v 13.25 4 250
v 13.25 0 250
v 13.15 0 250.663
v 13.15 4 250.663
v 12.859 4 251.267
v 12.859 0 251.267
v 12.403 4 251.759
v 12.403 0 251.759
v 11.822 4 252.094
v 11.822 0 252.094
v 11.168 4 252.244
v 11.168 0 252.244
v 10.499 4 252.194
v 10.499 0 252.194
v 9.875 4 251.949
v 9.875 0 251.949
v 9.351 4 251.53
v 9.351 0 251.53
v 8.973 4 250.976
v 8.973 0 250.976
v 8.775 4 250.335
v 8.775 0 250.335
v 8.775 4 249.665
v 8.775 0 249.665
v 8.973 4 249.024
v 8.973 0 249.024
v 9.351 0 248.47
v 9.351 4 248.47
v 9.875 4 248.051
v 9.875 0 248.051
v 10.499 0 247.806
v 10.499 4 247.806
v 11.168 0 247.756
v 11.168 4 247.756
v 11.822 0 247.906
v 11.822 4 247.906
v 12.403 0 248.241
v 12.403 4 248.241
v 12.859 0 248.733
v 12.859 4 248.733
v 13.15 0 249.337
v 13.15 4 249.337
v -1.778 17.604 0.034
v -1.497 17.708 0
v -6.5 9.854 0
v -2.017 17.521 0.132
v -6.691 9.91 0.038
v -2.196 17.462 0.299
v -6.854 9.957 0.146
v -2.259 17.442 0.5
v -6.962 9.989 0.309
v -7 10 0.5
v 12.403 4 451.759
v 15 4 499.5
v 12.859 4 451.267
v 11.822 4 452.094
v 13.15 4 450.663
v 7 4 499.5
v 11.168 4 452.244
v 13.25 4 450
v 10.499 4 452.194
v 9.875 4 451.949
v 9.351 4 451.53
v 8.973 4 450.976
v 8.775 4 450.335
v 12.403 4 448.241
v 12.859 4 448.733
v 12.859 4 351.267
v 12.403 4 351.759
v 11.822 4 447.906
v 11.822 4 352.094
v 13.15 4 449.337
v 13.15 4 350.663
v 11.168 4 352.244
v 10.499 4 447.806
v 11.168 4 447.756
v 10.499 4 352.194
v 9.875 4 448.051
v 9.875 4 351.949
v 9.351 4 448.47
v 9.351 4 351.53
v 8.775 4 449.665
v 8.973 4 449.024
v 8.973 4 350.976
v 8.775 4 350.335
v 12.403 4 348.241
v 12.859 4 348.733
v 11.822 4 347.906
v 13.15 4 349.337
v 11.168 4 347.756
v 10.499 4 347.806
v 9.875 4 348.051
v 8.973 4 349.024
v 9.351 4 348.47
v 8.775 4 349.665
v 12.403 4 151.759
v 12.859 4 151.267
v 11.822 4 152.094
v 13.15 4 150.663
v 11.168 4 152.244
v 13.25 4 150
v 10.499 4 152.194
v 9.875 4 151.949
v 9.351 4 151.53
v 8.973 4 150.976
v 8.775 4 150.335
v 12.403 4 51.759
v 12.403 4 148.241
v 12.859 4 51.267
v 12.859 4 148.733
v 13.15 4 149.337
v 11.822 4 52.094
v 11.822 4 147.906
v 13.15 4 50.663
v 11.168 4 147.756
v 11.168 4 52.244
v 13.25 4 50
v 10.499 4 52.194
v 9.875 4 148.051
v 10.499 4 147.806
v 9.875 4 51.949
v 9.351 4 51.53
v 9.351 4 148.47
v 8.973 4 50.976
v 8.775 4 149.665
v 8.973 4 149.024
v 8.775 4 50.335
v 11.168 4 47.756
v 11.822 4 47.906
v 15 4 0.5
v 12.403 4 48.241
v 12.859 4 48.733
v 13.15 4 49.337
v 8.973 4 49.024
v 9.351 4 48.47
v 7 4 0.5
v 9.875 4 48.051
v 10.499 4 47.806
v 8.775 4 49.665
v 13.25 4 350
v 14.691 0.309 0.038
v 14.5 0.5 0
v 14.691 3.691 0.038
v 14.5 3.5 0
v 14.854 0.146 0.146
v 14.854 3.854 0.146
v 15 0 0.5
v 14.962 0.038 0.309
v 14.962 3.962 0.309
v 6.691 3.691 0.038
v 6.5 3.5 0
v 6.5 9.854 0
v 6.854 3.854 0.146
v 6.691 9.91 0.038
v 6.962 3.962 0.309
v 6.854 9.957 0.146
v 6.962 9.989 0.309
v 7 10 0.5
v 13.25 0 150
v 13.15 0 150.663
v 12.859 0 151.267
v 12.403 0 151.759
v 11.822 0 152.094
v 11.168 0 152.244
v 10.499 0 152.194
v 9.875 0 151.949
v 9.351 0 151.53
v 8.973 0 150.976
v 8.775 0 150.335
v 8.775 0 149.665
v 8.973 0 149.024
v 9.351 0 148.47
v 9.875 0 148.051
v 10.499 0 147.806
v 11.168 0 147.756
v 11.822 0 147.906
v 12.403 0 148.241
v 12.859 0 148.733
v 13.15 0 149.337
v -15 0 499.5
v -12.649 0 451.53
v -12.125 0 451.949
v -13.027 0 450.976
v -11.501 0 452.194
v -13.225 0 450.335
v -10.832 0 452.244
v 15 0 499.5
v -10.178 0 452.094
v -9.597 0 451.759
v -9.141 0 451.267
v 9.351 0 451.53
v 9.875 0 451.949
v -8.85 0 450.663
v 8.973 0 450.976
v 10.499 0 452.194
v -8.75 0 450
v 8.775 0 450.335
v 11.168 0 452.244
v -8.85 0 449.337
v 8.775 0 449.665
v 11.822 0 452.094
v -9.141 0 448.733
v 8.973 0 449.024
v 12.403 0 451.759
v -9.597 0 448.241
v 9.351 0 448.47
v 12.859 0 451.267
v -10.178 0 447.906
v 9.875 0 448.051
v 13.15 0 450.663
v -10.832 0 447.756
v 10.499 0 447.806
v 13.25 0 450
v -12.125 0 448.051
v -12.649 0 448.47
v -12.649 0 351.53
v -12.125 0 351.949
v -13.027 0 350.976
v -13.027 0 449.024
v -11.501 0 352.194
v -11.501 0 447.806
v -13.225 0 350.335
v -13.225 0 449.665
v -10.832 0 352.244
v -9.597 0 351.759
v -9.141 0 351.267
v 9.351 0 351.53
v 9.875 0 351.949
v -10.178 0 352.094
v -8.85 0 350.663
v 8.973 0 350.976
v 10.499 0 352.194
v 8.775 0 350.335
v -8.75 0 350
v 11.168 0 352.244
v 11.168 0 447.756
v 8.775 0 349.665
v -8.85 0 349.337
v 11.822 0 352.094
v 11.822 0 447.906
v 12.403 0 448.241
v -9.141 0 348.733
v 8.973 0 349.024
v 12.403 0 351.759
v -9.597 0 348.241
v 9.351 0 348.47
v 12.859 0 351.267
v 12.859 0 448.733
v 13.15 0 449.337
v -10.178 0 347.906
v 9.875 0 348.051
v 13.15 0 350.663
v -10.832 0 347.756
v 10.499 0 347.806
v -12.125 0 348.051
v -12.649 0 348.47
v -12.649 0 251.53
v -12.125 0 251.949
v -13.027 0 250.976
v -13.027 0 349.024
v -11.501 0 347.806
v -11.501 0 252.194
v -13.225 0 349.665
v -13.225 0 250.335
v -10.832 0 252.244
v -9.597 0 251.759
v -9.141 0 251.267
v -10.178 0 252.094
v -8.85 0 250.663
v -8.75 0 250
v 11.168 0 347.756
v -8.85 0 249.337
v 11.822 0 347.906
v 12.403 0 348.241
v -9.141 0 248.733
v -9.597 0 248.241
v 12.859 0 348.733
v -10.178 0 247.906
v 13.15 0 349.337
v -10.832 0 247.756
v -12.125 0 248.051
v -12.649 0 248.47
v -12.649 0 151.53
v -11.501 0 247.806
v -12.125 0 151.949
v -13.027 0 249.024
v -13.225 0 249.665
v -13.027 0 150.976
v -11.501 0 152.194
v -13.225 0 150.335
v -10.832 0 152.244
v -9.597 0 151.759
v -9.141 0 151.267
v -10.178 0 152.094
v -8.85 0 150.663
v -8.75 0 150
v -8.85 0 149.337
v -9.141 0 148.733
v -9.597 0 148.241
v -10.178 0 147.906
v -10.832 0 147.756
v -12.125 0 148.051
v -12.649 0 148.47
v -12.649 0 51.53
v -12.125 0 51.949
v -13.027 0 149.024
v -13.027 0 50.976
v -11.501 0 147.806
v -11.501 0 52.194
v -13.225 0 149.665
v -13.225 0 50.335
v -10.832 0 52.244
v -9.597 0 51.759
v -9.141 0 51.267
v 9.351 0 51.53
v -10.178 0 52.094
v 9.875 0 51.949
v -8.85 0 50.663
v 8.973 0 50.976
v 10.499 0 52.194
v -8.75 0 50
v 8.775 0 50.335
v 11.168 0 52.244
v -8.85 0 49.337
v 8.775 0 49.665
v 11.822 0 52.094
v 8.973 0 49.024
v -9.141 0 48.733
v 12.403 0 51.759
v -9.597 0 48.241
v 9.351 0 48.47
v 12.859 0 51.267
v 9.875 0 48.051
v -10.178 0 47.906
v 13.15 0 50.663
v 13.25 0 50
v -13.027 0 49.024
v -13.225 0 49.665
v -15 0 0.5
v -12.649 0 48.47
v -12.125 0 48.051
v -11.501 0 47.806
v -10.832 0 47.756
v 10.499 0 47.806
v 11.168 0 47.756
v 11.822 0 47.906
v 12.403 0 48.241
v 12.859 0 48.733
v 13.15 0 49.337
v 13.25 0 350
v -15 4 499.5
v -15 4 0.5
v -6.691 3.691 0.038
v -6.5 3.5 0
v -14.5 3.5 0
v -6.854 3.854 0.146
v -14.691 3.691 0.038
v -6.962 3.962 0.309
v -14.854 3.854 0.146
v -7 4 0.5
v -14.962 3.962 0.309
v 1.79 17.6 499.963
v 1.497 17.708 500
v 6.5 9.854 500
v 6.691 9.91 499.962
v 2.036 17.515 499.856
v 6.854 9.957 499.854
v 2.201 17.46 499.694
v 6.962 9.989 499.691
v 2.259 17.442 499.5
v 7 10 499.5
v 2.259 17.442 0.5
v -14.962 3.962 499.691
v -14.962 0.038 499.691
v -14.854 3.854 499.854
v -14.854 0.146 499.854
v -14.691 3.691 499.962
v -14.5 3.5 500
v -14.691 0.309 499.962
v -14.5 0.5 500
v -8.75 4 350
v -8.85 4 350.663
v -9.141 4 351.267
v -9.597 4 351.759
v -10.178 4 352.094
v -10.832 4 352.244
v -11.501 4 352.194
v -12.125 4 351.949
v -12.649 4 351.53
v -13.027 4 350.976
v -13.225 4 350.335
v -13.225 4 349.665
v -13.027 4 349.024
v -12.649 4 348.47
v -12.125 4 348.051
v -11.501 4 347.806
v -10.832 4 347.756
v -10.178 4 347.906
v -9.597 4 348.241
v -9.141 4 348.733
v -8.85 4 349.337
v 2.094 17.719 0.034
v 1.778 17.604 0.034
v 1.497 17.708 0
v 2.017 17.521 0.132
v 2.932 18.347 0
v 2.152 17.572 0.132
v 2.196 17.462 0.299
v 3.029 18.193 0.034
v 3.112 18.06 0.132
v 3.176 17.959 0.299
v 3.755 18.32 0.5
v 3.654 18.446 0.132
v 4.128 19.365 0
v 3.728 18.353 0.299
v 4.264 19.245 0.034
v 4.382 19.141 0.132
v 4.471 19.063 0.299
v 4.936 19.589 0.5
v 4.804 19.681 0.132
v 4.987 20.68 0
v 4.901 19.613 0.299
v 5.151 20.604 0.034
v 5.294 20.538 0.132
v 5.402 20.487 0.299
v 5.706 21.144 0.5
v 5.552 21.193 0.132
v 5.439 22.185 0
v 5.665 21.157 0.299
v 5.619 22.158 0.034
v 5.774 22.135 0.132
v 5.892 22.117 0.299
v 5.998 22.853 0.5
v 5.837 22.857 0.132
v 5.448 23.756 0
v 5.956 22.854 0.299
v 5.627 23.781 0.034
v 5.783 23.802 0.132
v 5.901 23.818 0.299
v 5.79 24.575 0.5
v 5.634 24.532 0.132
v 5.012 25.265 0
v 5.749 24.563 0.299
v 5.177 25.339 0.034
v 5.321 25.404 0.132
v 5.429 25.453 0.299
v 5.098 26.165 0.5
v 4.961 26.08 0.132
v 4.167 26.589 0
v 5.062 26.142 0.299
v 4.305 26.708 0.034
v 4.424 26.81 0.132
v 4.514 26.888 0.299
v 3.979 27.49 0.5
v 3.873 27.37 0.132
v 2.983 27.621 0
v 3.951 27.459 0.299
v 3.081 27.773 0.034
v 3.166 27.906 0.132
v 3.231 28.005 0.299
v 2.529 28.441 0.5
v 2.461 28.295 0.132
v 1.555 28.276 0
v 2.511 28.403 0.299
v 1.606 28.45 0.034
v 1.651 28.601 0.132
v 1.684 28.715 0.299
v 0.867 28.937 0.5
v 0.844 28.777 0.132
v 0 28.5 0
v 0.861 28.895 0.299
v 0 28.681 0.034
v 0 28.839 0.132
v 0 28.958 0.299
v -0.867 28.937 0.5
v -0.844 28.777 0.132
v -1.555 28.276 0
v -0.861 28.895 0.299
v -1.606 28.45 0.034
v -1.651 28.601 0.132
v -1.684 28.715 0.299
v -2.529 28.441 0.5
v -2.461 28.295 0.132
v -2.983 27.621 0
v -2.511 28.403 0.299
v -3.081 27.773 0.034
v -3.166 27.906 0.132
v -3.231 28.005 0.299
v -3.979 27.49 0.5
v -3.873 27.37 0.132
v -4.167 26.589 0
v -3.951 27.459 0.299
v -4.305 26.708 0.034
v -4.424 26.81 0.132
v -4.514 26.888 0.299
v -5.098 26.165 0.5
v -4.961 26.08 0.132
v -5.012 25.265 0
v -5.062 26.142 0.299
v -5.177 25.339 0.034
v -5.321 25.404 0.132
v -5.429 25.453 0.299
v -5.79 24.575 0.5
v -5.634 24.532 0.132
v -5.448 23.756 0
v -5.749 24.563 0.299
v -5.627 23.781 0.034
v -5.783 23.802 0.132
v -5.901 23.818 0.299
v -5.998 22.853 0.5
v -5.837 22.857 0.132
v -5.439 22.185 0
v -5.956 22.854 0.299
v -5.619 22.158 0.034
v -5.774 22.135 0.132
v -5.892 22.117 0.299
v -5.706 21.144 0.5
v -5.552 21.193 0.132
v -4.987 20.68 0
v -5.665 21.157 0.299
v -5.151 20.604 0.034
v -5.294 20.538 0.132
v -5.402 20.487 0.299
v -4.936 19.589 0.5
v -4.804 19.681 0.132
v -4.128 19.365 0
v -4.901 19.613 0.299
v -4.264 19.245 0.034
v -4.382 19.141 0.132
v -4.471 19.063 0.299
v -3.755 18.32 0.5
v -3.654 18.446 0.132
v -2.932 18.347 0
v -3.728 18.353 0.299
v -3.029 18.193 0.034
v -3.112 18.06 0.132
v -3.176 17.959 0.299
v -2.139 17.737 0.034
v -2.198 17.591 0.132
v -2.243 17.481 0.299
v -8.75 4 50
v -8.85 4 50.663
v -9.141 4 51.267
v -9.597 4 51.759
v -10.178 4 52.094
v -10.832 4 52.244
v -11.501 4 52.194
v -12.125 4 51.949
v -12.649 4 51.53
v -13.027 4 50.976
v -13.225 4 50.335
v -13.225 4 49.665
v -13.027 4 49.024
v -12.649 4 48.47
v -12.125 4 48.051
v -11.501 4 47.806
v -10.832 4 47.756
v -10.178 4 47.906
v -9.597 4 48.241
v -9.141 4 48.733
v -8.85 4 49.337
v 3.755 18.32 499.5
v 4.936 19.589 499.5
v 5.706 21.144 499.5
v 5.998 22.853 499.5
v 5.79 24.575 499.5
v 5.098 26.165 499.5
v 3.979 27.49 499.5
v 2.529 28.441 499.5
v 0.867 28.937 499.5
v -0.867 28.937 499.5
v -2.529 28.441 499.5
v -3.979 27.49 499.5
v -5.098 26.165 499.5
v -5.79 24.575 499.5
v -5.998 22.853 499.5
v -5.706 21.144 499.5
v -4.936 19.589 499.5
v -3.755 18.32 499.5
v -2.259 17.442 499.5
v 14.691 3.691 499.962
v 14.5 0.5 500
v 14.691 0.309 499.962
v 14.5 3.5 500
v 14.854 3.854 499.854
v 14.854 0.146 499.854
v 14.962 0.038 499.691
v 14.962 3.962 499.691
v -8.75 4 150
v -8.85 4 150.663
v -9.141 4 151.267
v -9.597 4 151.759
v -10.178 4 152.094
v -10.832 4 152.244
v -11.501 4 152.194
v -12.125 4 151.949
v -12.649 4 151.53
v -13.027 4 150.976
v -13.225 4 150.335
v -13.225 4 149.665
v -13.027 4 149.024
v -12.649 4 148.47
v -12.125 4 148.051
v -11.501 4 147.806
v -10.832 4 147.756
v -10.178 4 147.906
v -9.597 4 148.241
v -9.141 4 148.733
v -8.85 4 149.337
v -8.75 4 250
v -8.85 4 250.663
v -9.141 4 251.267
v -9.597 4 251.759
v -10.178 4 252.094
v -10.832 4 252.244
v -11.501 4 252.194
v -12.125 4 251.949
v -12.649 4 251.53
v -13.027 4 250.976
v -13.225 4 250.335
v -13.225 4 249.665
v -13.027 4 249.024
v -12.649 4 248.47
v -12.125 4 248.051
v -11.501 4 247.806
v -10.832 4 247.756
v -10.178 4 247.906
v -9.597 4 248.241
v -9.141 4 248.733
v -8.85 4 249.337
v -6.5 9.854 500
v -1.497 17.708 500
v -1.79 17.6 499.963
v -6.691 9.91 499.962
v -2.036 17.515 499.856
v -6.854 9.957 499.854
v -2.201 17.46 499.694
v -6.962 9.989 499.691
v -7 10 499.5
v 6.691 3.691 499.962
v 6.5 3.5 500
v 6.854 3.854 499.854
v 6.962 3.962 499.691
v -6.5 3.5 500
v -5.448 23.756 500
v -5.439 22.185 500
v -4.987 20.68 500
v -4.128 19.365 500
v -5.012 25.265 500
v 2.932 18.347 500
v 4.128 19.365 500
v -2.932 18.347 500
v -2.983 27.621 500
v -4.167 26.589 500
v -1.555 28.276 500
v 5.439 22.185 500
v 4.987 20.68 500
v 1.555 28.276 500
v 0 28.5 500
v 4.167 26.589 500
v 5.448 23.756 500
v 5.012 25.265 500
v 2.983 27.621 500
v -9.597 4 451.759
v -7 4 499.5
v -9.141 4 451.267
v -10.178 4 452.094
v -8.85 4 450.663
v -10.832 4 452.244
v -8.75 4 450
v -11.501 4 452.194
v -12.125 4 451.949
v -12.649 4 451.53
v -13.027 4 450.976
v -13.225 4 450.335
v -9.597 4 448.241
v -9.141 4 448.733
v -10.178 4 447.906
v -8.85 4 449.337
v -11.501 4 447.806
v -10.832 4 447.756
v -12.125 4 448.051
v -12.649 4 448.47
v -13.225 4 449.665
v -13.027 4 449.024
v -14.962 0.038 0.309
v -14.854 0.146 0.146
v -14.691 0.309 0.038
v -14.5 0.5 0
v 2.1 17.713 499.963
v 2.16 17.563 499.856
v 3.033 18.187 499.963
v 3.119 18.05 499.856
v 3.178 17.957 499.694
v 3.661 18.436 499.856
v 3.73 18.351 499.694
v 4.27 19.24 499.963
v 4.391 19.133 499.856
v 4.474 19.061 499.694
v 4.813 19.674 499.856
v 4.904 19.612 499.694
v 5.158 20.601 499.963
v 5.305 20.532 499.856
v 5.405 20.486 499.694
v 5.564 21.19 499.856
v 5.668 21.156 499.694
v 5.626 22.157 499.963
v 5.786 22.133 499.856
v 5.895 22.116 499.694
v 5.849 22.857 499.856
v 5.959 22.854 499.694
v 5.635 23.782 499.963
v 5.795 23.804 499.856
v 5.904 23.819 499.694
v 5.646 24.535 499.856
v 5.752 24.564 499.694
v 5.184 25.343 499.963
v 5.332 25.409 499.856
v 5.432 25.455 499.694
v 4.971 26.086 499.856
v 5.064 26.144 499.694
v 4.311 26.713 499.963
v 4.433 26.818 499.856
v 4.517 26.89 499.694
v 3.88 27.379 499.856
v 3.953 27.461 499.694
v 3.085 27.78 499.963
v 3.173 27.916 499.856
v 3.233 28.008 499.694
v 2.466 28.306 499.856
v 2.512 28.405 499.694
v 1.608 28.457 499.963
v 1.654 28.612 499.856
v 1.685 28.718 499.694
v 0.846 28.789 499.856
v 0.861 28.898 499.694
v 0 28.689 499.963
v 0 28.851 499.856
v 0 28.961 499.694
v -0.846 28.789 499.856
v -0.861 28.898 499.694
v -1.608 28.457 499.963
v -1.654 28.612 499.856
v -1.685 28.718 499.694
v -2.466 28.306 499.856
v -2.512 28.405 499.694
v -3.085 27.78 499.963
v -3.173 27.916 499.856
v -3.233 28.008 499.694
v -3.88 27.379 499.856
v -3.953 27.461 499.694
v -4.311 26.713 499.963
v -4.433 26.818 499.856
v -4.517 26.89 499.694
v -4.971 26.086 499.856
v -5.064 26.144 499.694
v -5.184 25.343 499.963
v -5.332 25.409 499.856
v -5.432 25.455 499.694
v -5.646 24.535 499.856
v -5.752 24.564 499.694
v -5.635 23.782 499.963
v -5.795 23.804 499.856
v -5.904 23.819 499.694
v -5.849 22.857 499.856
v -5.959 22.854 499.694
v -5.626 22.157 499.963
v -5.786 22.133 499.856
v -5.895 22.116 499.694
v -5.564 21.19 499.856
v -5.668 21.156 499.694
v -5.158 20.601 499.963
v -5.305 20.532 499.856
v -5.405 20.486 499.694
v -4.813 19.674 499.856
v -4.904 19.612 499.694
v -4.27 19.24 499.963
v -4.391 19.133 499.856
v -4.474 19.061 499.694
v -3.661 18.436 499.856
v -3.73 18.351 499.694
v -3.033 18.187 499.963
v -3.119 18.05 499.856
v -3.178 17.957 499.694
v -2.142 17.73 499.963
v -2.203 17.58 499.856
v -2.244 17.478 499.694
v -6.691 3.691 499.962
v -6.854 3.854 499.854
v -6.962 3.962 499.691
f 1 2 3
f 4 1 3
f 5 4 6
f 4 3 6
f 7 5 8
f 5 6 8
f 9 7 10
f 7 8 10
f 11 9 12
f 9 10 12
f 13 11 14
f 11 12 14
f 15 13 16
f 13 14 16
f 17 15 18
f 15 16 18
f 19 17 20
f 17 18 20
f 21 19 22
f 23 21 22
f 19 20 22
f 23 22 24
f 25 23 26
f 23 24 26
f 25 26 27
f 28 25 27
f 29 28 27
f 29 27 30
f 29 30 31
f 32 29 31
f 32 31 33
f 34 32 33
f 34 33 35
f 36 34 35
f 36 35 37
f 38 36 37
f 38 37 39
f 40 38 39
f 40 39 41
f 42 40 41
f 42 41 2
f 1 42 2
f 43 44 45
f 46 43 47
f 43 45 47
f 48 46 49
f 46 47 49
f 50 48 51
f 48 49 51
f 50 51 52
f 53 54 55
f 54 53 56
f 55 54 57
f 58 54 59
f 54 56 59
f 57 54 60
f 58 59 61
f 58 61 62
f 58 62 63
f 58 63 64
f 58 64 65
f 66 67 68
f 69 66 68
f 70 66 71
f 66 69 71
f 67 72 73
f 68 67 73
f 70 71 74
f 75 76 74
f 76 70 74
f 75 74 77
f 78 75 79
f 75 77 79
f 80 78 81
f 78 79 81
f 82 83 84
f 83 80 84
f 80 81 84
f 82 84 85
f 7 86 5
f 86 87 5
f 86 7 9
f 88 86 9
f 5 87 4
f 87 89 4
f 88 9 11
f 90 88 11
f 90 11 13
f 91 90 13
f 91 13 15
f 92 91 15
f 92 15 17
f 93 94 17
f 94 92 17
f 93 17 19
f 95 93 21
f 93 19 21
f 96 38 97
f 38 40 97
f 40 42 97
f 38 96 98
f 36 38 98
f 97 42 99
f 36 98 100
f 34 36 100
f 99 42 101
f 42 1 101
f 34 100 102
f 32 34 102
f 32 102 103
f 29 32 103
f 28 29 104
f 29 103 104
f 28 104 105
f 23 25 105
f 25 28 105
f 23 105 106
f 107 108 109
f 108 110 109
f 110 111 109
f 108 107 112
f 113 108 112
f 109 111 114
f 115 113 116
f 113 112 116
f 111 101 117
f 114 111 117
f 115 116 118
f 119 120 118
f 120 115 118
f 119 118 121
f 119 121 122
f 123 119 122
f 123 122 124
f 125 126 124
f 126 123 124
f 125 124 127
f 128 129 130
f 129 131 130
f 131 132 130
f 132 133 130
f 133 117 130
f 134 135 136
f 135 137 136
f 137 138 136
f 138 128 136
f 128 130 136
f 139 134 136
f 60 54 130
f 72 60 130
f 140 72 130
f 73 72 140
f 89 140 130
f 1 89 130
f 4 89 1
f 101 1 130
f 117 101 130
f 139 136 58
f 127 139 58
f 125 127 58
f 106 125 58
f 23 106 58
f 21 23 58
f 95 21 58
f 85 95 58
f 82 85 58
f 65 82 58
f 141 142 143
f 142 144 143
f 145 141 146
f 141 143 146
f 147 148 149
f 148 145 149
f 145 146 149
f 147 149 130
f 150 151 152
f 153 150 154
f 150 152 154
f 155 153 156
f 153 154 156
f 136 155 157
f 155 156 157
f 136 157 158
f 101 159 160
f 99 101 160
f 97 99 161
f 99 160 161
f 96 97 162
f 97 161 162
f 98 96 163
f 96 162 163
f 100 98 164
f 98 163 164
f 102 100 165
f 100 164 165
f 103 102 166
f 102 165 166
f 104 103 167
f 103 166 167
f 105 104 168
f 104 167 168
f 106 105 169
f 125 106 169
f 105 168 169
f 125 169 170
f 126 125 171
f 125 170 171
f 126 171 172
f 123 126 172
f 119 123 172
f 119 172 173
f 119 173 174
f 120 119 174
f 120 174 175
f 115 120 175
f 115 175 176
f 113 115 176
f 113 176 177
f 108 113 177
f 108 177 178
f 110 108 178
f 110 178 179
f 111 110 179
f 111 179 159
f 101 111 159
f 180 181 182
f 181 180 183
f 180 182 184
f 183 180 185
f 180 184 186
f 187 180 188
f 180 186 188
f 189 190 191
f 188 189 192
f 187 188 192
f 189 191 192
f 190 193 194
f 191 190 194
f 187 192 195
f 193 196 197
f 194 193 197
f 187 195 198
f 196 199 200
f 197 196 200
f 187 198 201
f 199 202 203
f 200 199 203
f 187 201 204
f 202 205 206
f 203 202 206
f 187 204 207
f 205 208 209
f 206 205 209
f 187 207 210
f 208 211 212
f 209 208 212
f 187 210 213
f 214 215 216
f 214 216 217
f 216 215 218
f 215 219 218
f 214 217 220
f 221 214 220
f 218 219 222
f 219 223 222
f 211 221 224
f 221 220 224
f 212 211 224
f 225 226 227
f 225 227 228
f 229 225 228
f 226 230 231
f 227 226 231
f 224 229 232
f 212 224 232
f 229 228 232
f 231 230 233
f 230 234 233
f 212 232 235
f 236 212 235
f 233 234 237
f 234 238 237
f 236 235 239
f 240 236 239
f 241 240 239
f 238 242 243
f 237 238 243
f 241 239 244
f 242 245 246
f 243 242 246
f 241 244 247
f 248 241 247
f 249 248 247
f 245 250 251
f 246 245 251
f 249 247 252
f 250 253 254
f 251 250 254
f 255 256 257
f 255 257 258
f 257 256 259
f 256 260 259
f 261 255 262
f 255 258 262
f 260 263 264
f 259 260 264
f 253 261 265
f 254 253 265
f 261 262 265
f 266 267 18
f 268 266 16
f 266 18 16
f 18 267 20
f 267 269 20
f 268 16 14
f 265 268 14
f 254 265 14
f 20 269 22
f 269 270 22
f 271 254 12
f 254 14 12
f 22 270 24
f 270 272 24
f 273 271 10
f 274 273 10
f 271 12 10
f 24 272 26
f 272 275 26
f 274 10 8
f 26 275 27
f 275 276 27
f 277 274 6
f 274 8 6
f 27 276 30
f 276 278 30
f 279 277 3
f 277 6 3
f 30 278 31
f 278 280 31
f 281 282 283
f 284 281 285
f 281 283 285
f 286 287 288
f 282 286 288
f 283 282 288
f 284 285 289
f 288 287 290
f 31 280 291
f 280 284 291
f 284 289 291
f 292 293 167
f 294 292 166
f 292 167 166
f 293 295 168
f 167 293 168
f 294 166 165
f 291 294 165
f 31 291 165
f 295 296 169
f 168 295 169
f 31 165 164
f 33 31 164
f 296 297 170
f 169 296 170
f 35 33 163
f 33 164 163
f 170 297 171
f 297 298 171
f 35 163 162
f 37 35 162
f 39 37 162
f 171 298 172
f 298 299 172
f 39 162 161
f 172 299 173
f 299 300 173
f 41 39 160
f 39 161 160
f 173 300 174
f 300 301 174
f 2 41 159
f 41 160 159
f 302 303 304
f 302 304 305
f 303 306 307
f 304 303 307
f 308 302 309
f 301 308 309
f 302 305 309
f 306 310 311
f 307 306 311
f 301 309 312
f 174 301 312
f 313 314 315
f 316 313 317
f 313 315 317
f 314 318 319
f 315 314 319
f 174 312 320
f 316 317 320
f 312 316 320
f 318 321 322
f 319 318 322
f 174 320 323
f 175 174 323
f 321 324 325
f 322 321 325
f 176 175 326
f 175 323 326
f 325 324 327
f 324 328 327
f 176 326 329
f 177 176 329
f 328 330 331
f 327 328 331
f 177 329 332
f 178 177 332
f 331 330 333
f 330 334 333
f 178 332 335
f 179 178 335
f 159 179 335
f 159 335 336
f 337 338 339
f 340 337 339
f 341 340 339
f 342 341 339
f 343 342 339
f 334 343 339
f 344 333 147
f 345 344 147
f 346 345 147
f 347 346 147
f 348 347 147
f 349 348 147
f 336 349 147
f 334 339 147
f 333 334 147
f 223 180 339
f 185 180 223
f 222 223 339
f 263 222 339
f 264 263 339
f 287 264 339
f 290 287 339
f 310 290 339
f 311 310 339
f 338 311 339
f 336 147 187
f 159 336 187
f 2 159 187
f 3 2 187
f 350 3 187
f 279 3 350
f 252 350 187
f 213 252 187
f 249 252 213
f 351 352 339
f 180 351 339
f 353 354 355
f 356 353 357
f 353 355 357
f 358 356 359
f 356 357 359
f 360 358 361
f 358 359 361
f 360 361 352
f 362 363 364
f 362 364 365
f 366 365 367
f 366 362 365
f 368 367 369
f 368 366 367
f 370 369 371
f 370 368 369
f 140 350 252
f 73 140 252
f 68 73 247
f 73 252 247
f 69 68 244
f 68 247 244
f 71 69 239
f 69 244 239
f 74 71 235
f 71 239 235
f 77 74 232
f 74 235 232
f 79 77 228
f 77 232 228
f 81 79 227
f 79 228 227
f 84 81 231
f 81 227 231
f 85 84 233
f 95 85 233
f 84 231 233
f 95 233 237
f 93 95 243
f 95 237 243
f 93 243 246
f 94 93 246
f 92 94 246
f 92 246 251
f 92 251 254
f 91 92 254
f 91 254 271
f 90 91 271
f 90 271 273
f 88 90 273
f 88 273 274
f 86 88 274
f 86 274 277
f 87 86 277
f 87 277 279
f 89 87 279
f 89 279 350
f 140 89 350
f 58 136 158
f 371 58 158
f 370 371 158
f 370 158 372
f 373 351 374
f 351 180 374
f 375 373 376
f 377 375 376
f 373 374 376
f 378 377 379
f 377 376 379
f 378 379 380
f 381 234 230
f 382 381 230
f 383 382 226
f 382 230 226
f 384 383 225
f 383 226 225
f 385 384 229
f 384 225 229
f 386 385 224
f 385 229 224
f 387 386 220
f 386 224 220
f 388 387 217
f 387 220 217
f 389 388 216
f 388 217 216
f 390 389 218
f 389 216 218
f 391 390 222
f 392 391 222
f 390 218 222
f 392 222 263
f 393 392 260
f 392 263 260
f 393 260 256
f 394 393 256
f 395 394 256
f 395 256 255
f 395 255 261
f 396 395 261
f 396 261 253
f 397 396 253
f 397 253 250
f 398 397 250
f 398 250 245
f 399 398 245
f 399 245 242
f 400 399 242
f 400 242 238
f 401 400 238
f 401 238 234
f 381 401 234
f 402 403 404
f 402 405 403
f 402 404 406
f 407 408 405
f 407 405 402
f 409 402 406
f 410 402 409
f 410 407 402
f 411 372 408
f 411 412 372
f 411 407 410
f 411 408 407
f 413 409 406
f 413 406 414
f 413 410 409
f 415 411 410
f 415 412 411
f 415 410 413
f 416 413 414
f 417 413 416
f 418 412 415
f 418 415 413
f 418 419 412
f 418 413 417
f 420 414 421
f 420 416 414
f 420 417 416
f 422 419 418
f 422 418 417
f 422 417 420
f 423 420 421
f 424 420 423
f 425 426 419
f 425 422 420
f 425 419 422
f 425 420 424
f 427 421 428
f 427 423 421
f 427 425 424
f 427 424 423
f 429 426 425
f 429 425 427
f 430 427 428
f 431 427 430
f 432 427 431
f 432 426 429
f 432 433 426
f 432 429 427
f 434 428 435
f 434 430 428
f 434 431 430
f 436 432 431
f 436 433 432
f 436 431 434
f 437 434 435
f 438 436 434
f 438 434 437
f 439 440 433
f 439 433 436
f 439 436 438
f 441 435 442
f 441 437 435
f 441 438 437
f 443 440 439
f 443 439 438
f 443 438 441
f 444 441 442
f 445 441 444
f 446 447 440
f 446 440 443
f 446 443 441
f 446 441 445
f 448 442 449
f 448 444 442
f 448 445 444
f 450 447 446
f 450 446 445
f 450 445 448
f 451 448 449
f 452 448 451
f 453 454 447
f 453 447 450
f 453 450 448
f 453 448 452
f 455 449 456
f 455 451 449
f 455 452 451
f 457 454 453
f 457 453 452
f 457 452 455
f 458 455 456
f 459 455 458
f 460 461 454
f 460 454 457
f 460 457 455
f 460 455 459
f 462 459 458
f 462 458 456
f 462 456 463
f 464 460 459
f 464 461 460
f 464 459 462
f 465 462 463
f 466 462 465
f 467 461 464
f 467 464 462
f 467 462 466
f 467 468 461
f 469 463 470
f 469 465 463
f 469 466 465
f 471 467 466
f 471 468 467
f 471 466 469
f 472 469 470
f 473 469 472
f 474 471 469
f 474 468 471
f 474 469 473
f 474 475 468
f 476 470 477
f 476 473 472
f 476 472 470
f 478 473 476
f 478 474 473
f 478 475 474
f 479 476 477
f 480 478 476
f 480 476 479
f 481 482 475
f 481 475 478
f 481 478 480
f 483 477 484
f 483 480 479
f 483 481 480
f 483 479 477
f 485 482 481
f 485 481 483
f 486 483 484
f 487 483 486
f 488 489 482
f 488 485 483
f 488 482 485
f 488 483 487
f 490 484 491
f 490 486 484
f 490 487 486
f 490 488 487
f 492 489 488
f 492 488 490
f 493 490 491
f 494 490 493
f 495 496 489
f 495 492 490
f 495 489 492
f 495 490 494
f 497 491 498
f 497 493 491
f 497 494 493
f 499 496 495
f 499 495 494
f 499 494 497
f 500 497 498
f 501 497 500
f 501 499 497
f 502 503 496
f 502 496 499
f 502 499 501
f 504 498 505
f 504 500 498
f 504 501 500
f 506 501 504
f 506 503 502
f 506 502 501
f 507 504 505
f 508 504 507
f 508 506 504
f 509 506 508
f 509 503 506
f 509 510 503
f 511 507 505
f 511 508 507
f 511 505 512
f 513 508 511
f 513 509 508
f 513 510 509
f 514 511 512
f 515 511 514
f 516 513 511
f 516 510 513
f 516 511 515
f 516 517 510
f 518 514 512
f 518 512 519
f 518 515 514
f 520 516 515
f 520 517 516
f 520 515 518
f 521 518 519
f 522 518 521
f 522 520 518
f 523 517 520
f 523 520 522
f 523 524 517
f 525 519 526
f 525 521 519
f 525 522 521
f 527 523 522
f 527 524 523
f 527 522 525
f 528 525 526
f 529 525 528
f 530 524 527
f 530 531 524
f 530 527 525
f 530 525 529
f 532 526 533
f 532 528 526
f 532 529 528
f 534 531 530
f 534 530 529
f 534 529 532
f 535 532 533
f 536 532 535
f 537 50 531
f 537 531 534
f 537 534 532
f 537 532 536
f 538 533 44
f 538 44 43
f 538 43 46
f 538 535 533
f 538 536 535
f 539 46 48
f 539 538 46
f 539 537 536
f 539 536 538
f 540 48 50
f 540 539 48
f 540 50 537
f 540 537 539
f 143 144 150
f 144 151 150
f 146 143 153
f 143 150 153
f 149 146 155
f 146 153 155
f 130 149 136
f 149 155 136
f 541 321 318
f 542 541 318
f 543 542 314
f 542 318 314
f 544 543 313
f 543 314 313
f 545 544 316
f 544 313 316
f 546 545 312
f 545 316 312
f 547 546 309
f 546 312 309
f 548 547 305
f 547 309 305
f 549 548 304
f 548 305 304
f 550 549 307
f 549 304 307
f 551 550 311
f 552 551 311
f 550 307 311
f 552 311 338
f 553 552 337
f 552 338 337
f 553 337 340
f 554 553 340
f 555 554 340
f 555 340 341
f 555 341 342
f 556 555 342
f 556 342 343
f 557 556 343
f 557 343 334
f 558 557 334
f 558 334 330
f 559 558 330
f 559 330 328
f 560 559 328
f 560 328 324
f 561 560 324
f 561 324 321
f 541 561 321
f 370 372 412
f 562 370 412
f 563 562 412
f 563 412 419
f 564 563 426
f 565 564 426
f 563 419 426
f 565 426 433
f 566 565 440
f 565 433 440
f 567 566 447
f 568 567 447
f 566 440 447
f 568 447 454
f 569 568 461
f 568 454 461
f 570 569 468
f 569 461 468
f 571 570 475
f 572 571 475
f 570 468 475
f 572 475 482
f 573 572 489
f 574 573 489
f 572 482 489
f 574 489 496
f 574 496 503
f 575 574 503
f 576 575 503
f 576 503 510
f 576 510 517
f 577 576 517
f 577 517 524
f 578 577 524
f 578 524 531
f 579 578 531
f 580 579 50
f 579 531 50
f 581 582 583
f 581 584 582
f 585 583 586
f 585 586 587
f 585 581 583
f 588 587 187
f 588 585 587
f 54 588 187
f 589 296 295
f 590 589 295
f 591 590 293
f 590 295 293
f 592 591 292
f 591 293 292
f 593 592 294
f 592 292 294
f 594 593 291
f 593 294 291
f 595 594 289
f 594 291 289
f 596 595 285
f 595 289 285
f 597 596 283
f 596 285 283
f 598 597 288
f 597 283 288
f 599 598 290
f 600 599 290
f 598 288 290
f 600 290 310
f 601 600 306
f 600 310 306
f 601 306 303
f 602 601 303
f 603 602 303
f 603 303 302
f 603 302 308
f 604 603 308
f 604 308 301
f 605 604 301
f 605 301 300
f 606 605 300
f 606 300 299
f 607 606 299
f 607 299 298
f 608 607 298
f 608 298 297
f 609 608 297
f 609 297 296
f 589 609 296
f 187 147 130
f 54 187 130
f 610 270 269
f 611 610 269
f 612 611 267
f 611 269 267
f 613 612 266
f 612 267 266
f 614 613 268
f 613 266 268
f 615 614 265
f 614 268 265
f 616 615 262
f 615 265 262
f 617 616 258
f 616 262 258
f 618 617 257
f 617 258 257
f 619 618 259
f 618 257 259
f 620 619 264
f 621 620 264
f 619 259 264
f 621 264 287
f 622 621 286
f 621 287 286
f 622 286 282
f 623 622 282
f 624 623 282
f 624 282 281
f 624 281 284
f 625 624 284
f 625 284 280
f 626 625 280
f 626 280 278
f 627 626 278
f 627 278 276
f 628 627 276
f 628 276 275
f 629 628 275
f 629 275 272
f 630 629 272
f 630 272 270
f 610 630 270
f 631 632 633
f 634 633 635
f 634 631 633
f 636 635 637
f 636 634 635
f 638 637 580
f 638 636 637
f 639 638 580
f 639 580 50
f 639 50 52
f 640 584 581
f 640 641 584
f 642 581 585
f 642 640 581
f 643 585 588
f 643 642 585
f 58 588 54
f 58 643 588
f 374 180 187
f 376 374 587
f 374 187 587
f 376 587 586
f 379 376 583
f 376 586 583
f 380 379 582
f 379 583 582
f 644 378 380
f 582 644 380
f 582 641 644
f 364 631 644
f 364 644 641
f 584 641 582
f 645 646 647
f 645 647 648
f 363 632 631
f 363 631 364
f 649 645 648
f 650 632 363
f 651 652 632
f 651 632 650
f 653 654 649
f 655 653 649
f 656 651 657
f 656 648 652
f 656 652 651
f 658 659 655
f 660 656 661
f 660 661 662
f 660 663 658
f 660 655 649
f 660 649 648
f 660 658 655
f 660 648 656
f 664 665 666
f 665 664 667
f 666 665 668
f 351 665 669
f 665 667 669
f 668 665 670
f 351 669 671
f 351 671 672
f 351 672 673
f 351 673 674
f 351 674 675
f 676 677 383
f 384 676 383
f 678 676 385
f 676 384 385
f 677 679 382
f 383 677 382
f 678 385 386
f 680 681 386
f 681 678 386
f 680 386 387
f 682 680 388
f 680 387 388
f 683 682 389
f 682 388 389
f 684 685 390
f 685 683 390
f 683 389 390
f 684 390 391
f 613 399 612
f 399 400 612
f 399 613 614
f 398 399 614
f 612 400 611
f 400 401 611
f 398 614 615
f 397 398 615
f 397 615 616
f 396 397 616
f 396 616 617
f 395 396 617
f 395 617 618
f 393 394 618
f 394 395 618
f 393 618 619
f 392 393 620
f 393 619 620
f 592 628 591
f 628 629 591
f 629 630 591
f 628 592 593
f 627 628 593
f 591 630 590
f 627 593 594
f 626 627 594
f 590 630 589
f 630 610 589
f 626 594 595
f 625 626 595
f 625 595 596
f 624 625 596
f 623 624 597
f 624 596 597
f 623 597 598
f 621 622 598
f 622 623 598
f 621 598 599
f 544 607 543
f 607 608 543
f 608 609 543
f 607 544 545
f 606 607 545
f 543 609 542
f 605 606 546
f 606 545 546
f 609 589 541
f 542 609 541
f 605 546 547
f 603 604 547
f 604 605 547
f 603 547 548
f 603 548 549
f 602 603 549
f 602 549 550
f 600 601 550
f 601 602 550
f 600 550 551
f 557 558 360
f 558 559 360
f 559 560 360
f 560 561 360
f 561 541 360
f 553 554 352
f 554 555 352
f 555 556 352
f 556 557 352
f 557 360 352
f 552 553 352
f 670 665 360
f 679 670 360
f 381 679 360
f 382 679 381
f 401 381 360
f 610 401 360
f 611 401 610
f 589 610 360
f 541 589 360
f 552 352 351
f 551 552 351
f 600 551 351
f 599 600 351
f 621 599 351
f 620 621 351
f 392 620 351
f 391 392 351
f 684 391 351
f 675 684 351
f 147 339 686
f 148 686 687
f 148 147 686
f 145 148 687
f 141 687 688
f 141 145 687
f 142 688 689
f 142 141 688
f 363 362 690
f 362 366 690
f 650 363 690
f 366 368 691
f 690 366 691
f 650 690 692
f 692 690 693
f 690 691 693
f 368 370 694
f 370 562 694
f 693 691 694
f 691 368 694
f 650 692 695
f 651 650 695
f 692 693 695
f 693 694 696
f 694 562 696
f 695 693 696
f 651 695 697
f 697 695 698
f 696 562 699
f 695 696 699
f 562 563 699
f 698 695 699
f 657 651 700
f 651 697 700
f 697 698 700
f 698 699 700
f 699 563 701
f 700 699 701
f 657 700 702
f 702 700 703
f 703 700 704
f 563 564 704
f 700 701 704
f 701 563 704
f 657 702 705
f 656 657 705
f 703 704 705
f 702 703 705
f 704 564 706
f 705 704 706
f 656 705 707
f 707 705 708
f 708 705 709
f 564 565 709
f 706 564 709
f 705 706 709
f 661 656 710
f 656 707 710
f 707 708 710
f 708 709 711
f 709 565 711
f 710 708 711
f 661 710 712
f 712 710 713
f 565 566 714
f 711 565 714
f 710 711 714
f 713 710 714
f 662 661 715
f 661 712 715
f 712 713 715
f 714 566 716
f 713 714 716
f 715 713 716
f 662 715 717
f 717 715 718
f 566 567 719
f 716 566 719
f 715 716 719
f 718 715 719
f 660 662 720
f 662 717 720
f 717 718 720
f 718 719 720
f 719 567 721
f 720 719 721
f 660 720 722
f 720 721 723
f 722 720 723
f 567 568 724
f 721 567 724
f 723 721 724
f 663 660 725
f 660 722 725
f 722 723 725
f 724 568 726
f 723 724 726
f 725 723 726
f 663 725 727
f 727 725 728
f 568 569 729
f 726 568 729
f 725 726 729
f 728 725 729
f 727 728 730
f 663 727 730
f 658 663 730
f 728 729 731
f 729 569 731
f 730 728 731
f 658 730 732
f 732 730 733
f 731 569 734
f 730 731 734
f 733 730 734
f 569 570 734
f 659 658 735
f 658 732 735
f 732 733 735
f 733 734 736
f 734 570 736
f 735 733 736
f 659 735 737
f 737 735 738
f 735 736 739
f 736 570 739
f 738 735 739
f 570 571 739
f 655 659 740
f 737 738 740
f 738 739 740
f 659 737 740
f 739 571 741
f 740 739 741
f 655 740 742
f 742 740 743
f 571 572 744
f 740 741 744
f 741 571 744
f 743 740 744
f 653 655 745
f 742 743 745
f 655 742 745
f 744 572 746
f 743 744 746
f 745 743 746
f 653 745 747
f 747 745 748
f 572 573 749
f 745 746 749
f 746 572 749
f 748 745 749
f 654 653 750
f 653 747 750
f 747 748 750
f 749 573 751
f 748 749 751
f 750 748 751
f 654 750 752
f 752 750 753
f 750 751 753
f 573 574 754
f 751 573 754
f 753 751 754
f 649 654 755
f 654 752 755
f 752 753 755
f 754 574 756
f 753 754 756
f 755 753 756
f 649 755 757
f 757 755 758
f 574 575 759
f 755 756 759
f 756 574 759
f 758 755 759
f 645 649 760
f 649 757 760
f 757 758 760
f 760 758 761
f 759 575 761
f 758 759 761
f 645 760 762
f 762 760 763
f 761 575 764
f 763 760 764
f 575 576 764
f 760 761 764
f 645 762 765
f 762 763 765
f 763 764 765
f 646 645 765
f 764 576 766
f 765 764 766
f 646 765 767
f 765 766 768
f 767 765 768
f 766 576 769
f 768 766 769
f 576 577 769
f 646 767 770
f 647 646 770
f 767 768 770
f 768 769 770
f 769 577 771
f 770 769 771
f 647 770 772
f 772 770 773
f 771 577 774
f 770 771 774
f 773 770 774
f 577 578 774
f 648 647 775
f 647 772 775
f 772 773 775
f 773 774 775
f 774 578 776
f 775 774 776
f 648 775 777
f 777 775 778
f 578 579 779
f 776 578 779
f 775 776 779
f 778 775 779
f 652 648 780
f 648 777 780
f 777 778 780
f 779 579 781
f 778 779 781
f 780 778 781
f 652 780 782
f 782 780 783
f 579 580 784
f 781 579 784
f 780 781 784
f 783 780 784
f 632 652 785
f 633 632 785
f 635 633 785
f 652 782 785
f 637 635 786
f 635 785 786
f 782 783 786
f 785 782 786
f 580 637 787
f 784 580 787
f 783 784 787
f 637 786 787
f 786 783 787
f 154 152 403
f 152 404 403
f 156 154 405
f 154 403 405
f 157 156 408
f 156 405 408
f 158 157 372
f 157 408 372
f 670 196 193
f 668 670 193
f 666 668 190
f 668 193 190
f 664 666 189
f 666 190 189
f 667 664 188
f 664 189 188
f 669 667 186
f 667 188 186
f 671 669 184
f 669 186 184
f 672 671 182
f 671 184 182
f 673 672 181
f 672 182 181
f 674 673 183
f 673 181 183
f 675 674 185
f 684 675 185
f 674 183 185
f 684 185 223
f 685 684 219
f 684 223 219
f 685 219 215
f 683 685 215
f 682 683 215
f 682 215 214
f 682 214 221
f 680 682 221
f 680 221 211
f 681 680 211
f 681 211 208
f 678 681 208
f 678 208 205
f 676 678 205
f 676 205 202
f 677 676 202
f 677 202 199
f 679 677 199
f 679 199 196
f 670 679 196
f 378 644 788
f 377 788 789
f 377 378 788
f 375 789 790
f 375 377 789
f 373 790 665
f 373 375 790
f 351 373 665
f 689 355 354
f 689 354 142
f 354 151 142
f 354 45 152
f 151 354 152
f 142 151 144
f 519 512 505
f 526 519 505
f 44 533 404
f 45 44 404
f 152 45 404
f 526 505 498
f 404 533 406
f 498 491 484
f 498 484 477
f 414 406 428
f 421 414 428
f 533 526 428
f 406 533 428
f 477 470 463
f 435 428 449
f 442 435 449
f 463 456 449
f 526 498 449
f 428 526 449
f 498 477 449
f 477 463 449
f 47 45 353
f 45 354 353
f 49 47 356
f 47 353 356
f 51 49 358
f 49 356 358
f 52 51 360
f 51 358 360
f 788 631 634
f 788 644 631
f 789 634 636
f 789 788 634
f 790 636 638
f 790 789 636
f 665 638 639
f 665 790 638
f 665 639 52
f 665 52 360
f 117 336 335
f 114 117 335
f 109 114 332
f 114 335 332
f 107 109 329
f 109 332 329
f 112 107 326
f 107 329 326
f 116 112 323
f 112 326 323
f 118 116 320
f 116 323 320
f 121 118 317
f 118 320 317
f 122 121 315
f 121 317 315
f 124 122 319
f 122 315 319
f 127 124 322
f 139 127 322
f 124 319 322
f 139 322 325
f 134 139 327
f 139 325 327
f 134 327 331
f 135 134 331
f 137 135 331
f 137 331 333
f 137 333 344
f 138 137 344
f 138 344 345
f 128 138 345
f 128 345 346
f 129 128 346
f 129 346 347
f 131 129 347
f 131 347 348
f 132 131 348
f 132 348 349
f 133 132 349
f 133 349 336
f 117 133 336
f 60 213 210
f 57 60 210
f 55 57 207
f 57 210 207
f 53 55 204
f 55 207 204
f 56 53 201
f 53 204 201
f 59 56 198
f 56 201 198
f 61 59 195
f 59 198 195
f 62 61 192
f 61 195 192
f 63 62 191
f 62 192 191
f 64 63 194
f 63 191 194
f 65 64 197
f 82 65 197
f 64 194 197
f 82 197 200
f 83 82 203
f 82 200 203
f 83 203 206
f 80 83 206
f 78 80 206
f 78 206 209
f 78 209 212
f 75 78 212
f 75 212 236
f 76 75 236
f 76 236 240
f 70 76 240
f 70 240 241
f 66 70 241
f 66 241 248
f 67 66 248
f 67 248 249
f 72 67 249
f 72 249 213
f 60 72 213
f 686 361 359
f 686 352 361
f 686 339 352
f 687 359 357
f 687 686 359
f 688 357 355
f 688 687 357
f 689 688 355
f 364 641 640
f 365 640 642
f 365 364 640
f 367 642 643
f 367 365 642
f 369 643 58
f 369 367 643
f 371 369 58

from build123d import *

# Parameters (mm, degrees)
BOSS_EXTRUDE1_DEPTH  = 500
SKETCH2_R            = 2.25
CUT_EXTRUDE1_DEPTH   = 502.06486606
LPATTERN1_COUNT      = 5
LPATTERN1_PITCH      = 100
LPATTERN1_COUNT_DIR2 = 2
LPATTERN1_PITCH_DIR2 = 22
FILLET1_R            = 0.5


with BuildPart() as part:
    # Sketch1 → Boss-Extrude1 (new body)
    with BuildSketch(Plane.XY):
        with BuildLine():
            Line((-15, 0), (15, 0))
            Line((15, 0), (15, 4))
            Line((15, 4), (7, 4))
            Line((7, 4), (7, 10))
            Line((7, 10), (2.259191805, 17.441578247))
            ThreePointArc((2.259191805, 17.441578247), (0, 29), (-2.259191805, 17.441578247))
            Line((-2.259191805, 17.441578247), (-7, 10))
            Line((-7, 10), (-7, 4))
            Line((-7, 4), (-15, 4))
            Line((-15, 4), (-15, 0))
        make_face()
    extrude(amount=BOSS_EXTRUDE1_DEPTH)

    # Sketch2 → Cut-Extrude1 (cut, through all)
    with BuildSketch(Plane.XZ):
        with Locations((-11, 50)):
            Circle(SKETCH2_R)
    cut_extrude1 = extrude(amount=-CUT_EXTRUDE1_DEPTH, mode=Mode.SUBTRACT)

    # LPattern1: Cut-Extrude1 5 × 2
    with Locations(*[(j * LPATTERN1_PITCH_DIR2, 0, i * LPATTERN1_PITCH) for i in range(LPATTERN1_COUNT) for j in range(LPATTERN1_COUNT_DIR2) if (i, j) != (0, 0)]):
        add(cut_extrude1, mode=Mode.SUBTRACT)

    # Fillet1
    fillet1_edges = [part.edges().sort_by_distance(p)[0] for p in [
        (-11, 4, 0),
        (-15, 2, 0),
        (0, 0, 0),
        (15, 2, 0),
        (11, 4, 0),
        (7, 7, 0),
        (4.629595903, 13.720789123, 0),
        (0, 29, 500),
        (0, 29, 0),
        (-4.629595903, 13.720789123, 0),
        (-7, 7, 0),
        (4.629595903, 13.720789123, 500),
        (7, 7, 500),
        (11, 4, 500),
        (15, 2, 500),
        (0, 0, 500),
        (-15, 2, 500),
        (-11, 4, 500),
        (-7, 7, 500),
        (-4.629595903, 13.720789123, 500),
    ]]
    fillet(fillet1_edges, radius=FILLET1_R)


solid = part.part
